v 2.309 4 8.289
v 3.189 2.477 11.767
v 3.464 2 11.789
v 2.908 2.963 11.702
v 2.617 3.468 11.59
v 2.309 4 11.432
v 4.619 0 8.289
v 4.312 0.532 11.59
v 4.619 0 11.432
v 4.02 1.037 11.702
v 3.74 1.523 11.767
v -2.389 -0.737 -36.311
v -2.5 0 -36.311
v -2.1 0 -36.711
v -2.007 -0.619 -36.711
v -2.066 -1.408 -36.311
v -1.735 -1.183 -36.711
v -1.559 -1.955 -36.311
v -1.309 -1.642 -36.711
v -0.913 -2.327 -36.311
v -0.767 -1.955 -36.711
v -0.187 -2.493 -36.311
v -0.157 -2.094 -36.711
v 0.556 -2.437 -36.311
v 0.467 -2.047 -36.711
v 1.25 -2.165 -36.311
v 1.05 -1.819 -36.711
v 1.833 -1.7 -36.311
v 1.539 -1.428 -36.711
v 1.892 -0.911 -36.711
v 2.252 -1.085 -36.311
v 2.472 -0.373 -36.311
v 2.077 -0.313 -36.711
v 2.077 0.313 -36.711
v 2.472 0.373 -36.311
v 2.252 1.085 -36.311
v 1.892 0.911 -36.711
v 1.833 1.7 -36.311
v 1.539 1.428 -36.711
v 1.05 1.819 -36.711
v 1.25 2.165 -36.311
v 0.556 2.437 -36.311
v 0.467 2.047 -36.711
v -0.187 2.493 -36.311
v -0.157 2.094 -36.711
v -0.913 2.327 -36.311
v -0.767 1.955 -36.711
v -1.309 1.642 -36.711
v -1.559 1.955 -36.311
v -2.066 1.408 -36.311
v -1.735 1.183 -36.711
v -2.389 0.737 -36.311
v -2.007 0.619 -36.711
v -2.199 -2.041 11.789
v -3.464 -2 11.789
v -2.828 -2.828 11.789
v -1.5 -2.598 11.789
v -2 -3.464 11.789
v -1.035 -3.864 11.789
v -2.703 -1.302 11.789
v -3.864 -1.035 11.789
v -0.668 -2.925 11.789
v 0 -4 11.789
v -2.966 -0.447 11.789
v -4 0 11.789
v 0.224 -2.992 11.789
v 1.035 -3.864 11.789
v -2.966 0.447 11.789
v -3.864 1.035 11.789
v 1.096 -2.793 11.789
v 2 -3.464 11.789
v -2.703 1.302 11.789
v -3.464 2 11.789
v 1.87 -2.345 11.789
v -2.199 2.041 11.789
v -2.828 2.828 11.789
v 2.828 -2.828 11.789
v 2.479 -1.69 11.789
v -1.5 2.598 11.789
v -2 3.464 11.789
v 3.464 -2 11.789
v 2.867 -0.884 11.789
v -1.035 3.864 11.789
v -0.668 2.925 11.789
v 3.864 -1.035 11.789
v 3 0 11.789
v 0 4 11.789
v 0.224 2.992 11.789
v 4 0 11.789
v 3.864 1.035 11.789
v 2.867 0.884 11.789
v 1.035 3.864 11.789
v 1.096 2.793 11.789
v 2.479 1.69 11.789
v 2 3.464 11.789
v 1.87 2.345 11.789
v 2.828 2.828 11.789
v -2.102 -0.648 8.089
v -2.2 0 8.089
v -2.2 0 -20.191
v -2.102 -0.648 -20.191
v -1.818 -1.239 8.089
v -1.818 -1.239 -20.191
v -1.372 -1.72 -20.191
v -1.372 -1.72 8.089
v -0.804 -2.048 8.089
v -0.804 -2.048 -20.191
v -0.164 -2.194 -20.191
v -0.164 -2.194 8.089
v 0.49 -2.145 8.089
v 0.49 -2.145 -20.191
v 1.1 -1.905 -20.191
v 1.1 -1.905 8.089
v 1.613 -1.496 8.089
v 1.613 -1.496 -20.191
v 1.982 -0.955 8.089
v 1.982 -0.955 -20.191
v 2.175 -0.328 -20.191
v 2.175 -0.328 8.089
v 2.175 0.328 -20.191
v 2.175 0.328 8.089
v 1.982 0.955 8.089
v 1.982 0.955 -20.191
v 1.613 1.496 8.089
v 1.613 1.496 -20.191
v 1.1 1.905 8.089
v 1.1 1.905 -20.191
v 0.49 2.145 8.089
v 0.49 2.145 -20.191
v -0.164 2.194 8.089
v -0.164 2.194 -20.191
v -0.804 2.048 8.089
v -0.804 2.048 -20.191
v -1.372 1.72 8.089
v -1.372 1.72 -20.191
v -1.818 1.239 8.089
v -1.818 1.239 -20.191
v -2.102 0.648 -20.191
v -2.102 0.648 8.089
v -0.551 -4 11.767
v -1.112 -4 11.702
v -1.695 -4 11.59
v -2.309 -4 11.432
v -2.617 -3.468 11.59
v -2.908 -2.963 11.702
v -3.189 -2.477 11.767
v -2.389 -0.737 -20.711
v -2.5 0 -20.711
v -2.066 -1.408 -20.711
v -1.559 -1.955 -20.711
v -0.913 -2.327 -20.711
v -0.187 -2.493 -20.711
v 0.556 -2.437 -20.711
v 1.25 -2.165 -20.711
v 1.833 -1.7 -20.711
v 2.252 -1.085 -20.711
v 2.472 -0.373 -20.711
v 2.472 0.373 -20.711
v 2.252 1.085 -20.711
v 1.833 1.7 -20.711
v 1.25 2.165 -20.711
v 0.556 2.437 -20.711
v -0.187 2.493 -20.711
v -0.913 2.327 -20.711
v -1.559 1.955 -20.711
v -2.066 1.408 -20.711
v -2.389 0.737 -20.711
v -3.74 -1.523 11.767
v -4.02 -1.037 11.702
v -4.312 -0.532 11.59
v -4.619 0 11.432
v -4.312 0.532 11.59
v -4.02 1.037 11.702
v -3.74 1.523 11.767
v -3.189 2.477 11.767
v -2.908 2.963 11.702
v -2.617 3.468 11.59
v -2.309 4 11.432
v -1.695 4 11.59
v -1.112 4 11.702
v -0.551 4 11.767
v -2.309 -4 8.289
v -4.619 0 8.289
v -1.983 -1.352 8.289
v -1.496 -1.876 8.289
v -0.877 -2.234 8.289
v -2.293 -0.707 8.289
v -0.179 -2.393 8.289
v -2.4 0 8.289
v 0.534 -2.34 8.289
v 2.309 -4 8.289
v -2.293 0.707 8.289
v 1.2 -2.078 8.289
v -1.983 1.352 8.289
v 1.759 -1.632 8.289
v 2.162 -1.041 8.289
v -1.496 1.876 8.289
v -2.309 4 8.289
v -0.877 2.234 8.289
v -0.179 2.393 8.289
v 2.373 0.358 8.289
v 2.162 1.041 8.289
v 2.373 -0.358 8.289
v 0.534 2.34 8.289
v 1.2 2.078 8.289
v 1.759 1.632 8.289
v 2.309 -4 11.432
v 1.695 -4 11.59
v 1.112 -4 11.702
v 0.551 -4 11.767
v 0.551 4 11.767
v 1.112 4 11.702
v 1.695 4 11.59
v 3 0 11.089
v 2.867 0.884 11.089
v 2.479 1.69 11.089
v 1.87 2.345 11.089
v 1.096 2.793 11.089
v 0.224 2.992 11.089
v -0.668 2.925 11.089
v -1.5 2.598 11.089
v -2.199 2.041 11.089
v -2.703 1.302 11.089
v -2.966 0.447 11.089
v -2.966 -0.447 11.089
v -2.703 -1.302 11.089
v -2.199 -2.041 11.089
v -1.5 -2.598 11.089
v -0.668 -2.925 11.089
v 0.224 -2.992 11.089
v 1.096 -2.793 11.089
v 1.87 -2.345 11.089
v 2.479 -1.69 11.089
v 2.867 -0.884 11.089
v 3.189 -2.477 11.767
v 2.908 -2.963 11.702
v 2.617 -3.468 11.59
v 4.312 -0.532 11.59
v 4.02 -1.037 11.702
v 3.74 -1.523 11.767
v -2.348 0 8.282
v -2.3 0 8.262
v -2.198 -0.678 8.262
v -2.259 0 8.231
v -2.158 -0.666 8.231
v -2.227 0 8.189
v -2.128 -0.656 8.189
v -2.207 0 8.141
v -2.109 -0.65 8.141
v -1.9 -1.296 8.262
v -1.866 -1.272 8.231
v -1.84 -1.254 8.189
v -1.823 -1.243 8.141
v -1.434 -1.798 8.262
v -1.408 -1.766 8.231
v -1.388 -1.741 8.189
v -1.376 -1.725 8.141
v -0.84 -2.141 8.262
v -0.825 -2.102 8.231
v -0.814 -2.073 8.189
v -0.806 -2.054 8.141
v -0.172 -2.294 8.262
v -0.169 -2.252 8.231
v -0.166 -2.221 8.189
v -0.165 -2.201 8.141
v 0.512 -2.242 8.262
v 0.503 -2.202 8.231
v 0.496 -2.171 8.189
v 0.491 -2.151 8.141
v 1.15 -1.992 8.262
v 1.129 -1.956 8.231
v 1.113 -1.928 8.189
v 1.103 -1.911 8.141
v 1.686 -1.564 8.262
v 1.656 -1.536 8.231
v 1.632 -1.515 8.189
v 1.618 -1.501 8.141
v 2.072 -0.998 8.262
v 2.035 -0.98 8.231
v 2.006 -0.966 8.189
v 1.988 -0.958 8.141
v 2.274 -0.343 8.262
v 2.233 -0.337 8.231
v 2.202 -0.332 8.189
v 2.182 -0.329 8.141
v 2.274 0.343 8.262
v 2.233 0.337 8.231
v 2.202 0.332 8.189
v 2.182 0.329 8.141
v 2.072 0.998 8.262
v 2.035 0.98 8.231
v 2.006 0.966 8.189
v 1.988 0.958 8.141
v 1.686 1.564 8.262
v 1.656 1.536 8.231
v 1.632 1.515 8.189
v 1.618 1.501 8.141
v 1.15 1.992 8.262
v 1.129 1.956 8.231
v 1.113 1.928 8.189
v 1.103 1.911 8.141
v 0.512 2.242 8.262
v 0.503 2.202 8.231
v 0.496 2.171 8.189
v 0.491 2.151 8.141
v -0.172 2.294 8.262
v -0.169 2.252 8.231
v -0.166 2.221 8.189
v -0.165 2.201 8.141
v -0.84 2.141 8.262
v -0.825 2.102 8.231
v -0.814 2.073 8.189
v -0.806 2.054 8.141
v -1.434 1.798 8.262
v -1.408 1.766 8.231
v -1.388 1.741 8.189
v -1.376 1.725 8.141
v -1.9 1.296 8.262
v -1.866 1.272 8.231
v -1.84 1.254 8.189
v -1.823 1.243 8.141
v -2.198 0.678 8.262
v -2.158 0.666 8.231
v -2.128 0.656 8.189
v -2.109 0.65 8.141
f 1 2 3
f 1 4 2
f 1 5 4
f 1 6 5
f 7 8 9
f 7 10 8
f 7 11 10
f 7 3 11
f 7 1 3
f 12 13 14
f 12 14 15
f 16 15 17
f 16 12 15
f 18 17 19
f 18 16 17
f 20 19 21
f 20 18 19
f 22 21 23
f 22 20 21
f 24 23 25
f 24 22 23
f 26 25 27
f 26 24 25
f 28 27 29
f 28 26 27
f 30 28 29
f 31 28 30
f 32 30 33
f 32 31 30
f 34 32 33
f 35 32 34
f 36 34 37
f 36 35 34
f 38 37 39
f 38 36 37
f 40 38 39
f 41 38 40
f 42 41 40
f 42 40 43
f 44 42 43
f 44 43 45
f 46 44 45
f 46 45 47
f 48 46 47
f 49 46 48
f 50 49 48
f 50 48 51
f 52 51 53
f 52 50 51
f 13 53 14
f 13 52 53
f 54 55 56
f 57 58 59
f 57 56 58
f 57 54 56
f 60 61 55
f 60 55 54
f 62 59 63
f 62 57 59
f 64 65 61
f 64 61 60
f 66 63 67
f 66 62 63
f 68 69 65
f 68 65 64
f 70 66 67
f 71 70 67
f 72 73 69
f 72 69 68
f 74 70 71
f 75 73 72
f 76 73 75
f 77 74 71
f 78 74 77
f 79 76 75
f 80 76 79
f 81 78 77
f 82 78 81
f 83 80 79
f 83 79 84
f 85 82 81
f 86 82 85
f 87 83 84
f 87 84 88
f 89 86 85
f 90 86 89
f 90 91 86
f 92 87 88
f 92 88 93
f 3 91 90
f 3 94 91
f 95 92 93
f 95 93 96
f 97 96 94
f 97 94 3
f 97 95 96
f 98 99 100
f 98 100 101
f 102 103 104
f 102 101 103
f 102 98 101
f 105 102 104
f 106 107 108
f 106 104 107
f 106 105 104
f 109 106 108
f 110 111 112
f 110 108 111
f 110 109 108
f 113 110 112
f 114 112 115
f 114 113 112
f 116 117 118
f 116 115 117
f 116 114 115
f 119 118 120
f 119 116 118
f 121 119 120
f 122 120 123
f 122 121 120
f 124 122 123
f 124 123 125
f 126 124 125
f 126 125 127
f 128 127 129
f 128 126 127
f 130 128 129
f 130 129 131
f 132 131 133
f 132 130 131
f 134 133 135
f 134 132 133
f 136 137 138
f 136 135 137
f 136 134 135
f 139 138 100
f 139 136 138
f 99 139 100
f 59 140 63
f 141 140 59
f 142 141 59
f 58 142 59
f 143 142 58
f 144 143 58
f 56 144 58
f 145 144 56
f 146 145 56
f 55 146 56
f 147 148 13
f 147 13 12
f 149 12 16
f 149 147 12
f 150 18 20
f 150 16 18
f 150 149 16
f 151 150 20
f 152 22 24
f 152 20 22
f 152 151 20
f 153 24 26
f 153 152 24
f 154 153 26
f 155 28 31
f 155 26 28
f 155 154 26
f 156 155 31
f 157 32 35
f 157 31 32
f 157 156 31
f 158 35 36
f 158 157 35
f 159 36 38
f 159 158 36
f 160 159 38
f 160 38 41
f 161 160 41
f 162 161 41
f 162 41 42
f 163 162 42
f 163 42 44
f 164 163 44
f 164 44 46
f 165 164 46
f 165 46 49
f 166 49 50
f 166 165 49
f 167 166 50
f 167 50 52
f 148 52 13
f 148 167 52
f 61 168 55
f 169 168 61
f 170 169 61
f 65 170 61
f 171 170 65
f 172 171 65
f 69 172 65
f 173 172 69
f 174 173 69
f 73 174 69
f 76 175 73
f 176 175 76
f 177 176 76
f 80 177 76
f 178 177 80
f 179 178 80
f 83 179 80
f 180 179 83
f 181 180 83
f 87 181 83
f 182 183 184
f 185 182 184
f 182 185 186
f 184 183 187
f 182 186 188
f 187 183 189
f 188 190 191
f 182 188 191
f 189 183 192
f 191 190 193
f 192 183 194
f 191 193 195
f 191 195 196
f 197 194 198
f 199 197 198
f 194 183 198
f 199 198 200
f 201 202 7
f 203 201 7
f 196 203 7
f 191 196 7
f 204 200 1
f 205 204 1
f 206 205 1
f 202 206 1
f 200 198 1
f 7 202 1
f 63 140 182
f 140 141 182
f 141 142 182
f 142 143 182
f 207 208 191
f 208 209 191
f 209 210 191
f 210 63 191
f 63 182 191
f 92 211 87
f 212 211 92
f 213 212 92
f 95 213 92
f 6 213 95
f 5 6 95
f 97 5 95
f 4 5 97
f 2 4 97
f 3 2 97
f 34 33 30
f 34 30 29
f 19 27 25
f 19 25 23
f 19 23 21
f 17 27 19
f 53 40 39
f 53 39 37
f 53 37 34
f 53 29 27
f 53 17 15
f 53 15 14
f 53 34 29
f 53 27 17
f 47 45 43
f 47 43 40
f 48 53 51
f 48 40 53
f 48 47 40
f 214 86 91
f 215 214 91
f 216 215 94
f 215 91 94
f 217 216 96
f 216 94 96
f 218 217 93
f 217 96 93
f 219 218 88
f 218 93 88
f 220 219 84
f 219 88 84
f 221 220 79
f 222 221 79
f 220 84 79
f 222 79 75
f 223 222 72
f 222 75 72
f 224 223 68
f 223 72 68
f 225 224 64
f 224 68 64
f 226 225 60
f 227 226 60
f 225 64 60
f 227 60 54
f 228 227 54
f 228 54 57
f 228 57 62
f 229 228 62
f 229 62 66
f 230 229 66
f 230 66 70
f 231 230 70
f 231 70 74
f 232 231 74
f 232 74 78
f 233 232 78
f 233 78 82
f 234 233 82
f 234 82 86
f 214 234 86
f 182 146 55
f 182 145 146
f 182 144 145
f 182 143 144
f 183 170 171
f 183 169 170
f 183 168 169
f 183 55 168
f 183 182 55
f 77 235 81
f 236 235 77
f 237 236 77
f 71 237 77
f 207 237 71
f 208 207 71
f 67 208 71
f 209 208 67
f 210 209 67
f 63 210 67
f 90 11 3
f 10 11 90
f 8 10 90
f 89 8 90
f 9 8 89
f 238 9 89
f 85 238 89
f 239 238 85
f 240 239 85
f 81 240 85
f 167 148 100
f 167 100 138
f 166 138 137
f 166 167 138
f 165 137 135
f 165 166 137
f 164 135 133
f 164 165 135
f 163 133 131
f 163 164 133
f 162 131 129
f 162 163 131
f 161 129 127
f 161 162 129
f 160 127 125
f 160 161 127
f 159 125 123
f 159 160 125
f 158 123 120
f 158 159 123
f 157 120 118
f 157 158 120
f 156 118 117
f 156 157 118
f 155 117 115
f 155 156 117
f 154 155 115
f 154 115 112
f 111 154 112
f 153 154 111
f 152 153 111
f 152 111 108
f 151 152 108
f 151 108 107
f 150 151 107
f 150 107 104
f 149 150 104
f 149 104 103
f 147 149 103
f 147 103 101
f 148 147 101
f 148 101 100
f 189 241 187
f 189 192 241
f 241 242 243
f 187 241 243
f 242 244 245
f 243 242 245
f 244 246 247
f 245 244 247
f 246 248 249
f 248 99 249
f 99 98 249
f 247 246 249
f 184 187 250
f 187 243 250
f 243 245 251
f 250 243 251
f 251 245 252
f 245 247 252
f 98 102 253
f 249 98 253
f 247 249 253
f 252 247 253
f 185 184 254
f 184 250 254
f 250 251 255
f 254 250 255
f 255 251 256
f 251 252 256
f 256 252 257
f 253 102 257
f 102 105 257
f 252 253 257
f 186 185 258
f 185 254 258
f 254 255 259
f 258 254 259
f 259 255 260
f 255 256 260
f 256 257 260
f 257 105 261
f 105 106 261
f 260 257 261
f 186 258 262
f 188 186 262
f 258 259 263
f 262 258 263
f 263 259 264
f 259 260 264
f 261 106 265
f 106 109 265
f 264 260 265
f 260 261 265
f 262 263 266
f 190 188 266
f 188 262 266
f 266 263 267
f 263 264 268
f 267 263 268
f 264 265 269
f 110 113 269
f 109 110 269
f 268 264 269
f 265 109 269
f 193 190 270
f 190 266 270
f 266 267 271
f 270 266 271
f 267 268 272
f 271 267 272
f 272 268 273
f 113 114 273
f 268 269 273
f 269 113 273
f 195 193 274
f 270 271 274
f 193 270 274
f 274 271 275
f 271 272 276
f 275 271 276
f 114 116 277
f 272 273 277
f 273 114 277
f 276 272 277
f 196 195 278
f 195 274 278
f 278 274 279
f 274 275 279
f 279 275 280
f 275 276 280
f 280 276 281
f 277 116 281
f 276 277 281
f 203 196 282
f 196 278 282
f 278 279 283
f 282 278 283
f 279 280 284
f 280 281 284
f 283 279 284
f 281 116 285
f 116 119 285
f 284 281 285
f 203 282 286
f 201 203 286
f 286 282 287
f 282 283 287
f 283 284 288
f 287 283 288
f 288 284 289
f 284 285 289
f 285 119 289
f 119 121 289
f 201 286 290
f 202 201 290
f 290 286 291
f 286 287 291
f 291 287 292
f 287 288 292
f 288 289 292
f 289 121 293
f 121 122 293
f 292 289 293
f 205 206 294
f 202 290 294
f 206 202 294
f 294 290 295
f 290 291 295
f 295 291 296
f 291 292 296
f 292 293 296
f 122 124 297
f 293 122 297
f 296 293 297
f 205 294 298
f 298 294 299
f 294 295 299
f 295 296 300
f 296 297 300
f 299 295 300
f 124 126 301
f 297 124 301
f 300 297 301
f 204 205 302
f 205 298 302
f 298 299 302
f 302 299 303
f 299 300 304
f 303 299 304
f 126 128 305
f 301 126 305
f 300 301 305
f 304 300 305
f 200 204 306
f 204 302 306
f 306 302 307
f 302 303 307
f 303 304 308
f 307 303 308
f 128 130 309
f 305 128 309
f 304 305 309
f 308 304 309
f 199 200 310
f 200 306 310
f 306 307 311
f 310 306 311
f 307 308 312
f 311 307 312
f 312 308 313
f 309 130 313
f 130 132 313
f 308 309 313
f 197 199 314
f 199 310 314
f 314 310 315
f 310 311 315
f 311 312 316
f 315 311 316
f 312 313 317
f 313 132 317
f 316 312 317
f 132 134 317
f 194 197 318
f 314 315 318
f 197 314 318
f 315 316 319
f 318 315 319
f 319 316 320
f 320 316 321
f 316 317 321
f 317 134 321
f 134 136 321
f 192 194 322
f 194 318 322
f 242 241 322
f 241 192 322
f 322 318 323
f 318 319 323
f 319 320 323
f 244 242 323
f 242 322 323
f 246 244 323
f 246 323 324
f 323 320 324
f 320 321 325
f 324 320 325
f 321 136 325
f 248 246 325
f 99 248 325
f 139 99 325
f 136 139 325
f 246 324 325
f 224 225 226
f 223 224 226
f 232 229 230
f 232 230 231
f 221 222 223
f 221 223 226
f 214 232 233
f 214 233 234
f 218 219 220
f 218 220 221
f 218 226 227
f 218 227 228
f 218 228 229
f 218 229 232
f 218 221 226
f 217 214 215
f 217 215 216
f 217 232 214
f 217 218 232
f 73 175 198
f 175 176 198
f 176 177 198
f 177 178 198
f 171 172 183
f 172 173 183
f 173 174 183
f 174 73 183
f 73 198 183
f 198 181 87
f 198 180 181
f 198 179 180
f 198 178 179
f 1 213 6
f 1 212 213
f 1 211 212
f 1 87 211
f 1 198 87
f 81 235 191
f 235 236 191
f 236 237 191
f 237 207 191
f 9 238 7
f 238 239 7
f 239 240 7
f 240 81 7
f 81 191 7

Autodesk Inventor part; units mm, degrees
ref_plane "YZ Plane" through (0, 0, 0) normal (1, 0, 0) x (0, 1, 0)
sketch "Sketch2" plane through (0, 0, 0) normal (0, 1, 0) x (-1, 0, 0)
  line L0 (0, 8.2892) -> (0, -36.7108)
  line L1 (0, -36.7108) -> (2.1, -36.7108)
  line L2 (2.5, -36.3108) -> (2.5, -20.7108)
  line L3 (2.5, -20.7108) -> (2.2, -20.1912)
  line L4 (2.2, -20.1912) -> (2.2, 8.2892)
  line L5 (2.2, 8.2892) -> (0, 8.2892)
  line L6 (2.1, -36.7108) -> (2.5, -36.3108)
  line L7 (2.5, -36.7108) -> (2.5, -37.2765)
  line L8 (0, -46.3897) -> (0, 17.4023) projected
  dimension "Ds" = 4.4
  dimension "NND" = 5
  dimension "b" = 16
  dimension "d3" = 30
  dimension "d5" = 45
  dimension "PTC" = 0.8
  dimension "NLG" = 45
revolve "Revolution1" add sketch "Sketch2" angle 360 about axis through (0, 0, 8.2892) along (0, 0, -1)
sketch "Sketch3" plane through (0, 0, 8.2892) normal (0, 0, 1) x (1, 0, 0)
  circle A0 centre (0, 0) radius 2.2 projected
  line L0 (0, 4) -> (2.3094, 4)
  line L1 (2.3094, 4) -> (4.6188, 0)
  line L2 (4.6188, 0) -> (0, 0)
  line L3 (0, 0) -> (0, 4)
  line L4 (0, 4) -> (-2.3094, 4)
  line L5 (-2.3094, 4) -> (-4.6188, 0)
  line L6 (0, -4) -> (2.3094, -4)
  line L7 (2.3094, -4) -> (4.6188, 0)
  line L8 (-2.3094, -4) -> (-4.6188, 0)
  line L9 (0, -4) -> (-2.3094, -4)
  dimension "d9" = 60
  dimension "ParS" = 8
  dimension "msp_d11" = 8
extrude "Extrusion1" add sketch "Sketch3" along normal blind 3.5
sketch "Sketch4" plane through (0, 0, 0) normal (0, 1, 0) x (-1, 0, 0)
  line L0 (-4, 11.7892) -> (-4.6188, 11.7892)
  line L1 (-4.6188, 11.7892) -> (-4.6188, 11.4319)
  line L2 (-4.6188, 11.4319) -> (-4, 11.7892)
  line L3 (0, 4.4398) -> (0, 31.3854) projected
  line L4 (0, 27.536) -> (0, 27.1787)
  line L5 (-4.6188, 8.2892) -> (-4.6188, 11.7892) projected
  line L6 (-2.3094, 11.7892) -> (-4.6188, 11.7892) projected
  dimension "d14" = 30
  dimension "msp_d15" = 8
revolve "Revolution2" cut sketch "Sketch4" angle 360 about axis through (0, 0, 27.536) along (0, 0, -1)
sketch "Sketch5" plane through (0, 0, 11.7892) normal (0, 0, 1) x (1, 0, 0)
  arc A0 (3.4641, 2) -> (0, 4) centre (0, 0) ccw projected
  circle A1 centre (0, 0) radius 3
  dimension "d27" = 6
extrude "Extrusion2" cut sketch "Sketch5" against normal blind 0.7
thread "Thread1" size "M5x0.8" class "6g" standard "ISO Metric profile" full length
ref_plane "MSC_PF1" through (0, 0, 0) normal (0, 1, 0) x (-1, 0, 0)
ref_plane "MSC_PT1" through (0, 0, 8.2892) normal (0, 0, -1) x (-1, 0, 0)
fillet "Fillet1" radius 0.2 1 edges at (2.2, 0, 8.2892)
equation "\"msp_d11\" = ParS"
equation "\"msp_d15\" = ParS"
equation "\"d27\" = 0.75 * ParS"
equation "\"d28\" = 0.2 * ParK"
equation "\"d30\" = r"
equation "\"msp_d17\" = b"
equation "\"r\" = 0.2"
equation "\"THREADDIA\" = NND"
equation "\"ParK\" = 3.5"
properties part number "ISO 4015 - M5 x 45" material "Stainless Steel, 440C"
